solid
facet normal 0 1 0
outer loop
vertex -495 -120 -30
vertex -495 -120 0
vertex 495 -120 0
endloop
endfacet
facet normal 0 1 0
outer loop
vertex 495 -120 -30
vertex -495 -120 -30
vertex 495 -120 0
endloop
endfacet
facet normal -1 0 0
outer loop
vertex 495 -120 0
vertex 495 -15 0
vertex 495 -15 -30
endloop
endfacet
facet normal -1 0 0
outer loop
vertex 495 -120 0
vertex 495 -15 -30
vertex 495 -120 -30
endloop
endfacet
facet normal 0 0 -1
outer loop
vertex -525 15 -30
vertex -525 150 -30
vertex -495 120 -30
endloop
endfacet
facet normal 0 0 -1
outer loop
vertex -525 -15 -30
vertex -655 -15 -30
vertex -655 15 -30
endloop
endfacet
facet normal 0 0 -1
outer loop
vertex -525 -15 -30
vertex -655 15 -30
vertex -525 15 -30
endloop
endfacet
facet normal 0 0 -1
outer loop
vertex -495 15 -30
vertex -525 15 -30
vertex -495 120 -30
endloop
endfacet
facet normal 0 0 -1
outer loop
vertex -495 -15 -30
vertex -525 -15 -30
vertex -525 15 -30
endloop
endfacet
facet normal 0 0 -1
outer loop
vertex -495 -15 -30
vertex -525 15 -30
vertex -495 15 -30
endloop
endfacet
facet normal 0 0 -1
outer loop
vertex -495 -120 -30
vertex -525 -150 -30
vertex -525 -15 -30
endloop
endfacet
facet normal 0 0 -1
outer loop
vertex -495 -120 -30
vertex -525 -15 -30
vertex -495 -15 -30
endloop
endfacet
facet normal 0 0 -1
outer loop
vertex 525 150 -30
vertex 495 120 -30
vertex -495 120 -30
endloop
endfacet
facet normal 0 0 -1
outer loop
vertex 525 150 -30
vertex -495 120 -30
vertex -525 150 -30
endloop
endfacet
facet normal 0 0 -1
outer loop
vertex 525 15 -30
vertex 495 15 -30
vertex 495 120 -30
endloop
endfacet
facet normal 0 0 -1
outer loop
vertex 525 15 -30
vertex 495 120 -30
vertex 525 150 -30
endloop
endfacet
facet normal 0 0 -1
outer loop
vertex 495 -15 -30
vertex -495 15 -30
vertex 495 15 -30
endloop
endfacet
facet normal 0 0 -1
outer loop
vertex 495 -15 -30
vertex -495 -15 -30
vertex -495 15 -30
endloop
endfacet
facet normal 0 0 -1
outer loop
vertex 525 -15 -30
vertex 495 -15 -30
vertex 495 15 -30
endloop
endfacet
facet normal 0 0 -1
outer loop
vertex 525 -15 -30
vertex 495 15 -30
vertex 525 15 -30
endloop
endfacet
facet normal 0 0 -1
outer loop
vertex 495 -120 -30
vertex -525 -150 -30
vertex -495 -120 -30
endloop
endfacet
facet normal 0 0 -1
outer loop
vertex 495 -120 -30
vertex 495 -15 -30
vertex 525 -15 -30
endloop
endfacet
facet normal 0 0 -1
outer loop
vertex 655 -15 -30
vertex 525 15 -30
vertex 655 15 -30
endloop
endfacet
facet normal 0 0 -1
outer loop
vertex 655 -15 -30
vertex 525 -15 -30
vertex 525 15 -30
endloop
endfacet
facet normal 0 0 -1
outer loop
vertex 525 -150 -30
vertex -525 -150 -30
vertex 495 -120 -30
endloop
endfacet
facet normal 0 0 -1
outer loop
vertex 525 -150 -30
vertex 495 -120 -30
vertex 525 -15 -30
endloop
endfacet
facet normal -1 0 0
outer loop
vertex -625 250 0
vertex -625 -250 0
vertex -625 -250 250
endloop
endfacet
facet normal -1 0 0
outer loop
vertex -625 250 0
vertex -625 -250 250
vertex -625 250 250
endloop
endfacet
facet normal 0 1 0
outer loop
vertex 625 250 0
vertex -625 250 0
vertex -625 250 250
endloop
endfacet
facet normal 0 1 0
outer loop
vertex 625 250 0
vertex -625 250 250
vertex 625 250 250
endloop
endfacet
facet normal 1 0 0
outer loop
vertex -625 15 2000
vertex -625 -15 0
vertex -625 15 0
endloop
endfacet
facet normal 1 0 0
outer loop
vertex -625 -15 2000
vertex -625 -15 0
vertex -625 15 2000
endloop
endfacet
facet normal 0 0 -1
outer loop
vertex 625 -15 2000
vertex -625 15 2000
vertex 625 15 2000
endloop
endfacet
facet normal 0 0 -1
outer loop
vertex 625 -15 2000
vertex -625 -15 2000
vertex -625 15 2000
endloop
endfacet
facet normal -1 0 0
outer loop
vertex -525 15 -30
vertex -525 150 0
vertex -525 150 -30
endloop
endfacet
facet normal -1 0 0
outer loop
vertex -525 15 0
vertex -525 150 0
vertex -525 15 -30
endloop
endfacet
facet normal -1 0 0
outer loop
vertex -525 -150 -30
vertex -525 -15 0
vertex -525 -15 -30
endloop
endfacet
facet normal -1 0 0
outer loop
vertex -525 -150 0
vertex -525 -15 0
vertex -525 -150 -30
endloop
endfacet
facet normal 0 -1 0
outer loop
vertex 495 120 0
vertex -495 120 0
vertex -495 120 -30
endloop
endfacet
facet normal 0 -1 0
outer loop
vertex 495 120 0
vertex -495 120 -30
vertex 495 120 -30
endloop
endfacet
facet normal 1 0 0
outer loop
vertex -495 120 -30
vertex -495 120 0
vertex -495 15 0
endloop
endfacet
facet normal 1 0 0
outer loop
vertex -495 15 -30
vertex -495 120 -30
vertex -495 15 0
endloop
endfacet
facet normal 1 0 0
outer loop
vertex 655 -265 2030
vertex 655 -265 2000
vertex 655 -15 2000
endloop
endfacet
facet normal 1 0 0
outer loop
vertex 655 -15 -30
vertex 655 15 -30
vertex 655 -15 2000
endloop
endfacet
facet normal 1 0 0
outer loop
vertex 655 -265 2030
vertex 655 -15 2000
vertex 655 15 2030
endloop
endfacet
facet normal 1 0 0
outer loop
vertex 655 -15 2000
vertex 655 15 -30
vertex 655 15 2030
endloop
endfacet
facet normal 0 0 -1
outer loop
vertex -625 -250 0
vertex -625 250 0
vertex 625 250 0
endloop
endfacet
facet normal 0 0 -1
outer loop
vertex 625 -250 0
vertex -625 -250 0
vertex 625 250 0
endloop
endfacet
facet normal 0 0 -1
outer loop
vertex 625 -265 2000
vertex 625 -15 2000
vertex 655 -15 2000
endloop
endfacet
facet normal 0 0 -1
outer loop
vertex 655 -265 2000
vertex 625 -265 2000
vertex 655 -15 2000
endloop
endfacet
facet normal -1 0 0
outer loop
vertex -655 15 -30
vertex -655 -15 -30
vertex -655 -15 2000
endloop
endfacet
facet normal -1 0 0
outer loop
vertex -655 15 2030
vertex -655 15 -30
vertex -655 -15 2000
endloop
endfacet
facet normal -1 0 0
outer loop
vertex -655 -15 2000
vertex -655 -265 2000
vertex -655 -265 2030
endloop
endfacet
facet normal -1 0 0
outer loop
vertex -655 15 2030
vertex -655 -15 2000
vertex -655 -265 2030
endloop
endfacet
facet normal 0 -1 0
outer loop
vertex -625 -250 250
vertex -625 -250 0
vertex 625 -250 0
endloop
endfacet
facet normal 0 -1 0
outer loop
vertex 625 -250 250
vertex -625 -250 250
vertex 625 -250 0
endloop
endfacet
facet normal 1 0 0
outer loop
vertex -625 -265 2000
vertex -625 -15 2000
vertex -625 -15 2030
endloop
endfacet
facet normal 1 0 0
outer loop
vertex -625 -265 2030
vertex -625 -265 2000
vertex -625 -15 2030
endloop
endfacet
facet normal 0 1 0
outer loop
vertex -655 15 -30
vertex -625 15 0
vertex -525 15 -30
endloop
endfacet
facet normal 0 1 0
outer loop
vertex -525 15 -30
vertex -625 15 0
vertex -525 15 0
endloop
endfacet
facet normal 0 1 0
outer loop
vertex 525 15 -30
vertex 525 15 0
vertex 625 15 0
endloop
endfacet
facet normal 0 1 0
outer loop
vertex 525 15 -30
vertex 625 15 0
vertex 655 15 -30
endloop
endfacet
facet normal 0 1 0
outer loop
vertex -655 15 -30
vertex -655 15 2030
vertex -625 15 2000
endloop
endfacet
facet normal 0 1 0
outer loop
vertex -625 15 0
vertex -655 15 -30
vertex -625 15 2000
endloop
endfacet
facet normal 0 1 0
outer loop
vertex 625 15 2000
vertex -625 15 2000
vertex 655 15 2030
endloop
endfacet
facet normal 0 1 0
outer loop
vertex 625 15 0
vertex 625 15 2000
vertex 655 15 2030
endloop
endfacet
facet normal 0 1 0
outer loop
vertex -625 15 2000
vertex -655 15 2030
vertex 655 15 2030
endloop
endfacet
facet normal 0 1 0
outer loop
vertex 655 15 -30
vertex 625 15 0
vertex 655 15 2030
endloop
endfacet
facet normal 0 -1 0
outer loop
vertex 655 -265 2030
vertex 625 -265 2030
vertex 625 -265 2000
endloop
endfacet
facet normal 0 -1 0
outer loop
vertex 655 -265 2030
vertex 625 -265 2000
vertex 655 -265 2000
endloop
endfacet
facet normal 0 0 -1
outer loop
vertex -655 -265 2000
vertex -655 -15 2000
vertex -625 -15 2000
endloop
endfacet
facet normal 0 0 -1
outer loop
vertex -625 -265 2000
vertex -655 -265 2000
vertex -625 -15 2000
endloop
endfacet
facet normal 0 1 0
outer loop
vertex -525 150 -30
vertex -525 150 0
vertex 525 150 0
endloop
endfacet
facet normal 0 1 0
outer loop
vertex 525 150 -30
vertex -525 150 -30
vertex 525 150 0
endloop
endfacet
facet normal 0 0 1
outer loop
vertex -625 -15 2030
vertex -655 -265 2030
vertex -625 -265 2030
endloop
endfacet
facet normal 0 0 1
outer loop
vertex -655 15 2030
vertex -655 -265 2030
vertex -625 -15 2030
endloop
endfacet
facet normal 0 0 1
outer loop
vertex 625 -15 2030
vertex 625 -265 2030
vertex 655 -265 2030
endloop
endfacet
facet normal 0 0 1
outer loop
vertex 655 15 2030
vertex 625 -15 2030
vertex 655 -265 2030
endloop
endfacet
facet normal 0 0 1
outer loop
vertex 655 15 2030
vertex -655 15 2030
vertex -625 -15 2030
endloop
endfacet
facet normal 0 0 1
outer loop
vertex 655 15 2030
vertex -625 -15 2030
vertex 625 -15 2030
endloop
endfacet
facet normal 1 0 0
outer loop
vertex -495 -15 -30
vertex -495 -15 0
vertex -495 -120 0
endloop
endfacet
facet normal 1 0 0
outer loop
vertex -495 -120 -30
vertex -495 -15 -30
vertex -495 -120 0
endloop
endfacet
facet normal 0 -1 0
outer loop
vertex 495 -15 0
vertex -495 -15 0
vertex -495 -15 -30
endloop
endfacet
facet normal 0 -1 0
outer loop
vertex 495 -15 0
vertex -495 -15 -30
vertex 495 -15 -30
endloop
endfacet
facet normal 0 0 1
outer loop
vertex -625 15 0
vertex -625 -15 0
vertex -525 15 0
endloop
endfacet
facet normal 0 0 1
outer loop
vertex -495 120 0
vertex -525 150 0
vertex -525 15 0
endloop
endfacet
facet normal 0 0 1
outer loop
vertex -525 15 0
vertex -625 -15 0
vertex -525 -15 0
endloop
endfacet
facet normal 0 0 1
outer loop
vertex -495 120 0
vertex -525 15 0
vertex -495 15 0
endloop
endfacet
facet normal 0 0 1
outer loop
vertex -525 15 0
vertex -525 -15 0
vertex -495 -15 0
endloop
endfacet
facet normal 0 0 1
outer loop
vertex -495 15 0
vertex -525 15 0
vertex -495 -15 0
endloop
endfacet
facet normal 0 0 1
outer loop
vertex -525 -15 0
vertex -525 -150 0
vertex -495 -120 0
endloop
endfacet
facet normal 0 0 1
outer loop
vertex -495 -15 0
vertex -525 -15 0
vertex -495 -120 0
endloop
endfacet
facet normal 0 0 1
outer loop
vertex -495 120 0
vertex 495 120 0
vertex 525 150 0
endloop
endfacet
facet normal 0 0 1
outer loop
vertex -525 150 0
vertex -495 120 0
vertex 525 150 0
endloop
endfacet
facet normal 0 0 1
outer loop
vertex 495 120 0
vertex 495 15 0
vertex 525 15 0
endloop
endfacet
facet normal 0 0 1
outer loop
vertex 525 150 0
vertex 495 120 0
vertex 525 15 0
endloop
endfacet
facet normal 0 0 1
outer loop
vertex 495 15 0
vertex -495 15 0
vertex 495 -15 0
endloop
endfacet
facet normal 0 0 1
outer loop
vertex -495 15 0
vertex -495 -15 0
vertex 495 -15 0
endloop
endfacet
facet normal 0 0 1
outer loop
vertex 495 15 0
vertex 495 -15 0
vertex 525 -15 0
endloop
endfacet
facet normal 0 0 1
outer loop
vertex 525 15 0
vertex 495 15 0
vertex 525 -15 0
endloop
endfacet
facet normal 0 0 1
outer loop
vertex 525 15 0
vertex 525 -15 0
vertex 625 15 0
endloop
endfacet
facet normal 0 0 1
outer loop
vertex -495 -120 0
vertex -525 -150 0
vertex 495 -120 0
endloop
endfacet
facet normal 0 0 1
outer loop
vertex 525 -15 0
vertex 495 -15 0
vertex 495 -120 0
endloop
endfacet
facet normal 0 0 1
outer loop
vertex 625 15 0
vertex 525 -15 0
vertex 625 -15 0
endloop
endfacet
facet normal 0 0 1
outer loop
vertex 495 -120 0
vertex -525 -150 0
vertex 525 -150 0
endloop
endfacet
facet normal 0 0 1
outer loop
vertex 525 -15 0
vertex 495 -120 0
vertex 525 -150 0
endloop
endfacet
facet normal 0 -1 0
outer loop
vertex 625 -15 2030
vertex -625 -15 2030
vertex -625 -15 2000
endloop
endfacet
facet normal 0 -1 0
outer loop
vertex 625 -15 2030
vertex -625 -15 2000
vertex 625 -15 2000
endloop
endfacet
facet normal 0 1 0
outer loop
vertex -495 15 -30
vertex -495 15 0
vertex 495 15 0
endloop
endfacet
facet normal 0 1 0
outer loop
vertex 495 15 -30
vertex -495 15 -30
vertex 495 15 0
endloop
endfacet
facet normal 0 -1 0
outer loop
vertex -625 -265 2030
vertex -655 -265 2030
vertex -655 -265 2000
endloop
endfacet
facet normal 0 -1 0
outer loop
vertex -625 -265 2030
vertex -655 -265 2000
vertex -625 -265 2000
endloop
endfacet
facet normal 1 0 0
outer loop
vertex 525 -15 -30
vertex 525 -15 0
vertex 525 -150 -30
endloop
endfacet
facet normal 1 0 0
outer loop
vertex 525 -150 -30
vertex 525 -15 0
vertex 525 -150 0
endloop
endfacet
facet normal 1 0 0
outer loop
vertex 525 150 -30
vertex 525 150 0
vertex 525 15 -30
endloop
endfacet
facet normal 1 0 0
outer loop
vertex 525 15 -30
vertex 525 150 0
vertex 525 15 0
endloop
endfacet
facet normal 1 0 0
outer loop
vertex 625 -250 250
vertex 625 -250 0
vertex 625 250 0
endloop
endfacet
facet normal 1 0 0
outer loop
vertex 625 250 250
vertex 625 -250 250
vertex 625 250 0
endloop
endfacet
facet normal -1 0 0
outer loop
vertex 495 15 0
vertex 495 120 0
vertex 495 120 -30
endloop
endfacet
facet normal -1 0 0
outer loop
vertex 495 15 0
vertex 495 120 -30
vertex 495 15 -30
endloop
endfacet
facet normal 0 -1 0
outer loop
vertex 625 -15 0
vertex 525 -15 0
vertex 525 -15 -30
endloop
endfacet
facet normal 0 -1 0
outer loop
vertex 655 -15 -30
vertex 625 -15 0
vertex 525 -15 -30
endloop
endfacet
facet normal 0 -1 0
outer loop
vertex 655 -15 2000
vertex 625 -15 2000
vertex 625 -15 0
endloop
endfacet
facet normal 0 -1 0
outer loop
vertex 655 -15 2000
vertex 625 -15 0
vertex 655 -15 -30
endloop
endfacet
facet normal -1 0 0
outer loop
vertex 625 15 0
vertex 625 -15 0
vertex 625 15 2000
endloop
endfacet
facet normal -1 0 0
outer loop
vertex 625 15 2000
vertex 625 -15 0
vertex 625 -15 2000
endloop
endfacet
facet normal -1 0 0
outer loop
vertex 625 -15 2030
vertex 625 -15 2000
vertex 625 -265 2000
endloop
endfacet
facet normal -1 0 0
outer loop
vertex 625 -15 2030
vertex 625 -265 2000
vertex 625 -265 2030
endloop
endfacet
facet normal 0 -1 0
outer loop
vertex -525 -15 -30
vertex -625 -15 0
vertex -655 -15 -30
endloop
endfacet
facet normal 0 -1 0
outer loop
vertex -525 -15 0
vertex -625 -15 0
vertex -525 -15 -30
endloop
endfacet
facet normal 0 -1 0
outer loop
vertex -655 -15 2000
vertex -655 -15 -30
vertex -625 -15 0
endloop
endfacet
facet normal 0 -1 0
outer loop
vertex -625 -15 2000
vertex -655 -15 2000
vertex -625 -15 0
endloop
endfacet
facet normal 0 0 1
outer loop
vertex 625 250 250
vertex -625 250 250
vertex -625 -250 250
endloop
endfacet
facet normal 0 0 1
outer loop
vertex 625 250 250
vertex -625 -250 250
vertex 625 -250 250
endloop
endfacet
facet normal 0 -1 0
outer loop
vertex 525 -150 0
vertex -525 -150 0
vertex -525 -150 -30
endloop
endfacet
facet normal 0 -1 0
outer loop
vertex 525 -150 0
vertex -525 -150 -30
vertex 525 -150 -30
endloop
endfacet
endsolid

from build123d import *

# Parameters (mm, degrees)
F0_W     = 1250
F0_H     = 500
F1_DEPTH = 250
F2_W     = 1310
F2_H     = 2060
F2_W_2   = 1250
F2_H_2   = 2000
F3_DEPTH = 15
F4_W     = 1050
F4_H     = 300
F4_W_2   = 990
F4_H_2   = 240
F5_DEPTH = 30
F6_W     = 30
F6_H     = 30
F7_DEPTH = 250


# Not quite as in the source:
# - a feature of the source that left no trace in its solid (it failed there, or was rolled back) is left out


with BuildPart() as f1:
    # F0 (on Top) → F1 (new body)
    with BuildSketch(Plane.XY):
        Rectangle(F0_W, F0_H)
    extrude(amount=F1_DEPTH)


with BuildPart() as f3:
    # F2 (on Front) → F3 (new body, symmetric)
    with BuildSketch(Plane.XZ):
        with Locations((0, 1000)):
            Rectangle(F2_W, F2_H)
        with Locations((0, 1000)):
            Rectangle(F2_W_2, F2_H_2, mode=Mode.SUBTRACT)
    extrude(amount=F3_DEPTH, both=True)

    # F4 (on face) → F5 (join)
    with BuildSketch(Plane(origin=(0, 0, 0), x_dir=(1, 0, 0), z_dir=(0, 0, -1))):
        Rectangle(F4_W, F4_H)
        Rectangle(F4_W_2, F4_H_2, mode=Mode.SUBTRACT)
    extrude(amount=F5_DEPTH)

    # F6 (on face) → F7 (join)
    with BuildSketch(Plane.XZ.offset(15)):
        with Locations((640, 2015)):
            Rectangle(F6_W, F6_H)
        with Locations((-640, 2015)):
            Rectangle(F6_W, F6_H)
    extrude(amount=F7_DEPTH)


solid = Compound([f1.part, f3.part])
